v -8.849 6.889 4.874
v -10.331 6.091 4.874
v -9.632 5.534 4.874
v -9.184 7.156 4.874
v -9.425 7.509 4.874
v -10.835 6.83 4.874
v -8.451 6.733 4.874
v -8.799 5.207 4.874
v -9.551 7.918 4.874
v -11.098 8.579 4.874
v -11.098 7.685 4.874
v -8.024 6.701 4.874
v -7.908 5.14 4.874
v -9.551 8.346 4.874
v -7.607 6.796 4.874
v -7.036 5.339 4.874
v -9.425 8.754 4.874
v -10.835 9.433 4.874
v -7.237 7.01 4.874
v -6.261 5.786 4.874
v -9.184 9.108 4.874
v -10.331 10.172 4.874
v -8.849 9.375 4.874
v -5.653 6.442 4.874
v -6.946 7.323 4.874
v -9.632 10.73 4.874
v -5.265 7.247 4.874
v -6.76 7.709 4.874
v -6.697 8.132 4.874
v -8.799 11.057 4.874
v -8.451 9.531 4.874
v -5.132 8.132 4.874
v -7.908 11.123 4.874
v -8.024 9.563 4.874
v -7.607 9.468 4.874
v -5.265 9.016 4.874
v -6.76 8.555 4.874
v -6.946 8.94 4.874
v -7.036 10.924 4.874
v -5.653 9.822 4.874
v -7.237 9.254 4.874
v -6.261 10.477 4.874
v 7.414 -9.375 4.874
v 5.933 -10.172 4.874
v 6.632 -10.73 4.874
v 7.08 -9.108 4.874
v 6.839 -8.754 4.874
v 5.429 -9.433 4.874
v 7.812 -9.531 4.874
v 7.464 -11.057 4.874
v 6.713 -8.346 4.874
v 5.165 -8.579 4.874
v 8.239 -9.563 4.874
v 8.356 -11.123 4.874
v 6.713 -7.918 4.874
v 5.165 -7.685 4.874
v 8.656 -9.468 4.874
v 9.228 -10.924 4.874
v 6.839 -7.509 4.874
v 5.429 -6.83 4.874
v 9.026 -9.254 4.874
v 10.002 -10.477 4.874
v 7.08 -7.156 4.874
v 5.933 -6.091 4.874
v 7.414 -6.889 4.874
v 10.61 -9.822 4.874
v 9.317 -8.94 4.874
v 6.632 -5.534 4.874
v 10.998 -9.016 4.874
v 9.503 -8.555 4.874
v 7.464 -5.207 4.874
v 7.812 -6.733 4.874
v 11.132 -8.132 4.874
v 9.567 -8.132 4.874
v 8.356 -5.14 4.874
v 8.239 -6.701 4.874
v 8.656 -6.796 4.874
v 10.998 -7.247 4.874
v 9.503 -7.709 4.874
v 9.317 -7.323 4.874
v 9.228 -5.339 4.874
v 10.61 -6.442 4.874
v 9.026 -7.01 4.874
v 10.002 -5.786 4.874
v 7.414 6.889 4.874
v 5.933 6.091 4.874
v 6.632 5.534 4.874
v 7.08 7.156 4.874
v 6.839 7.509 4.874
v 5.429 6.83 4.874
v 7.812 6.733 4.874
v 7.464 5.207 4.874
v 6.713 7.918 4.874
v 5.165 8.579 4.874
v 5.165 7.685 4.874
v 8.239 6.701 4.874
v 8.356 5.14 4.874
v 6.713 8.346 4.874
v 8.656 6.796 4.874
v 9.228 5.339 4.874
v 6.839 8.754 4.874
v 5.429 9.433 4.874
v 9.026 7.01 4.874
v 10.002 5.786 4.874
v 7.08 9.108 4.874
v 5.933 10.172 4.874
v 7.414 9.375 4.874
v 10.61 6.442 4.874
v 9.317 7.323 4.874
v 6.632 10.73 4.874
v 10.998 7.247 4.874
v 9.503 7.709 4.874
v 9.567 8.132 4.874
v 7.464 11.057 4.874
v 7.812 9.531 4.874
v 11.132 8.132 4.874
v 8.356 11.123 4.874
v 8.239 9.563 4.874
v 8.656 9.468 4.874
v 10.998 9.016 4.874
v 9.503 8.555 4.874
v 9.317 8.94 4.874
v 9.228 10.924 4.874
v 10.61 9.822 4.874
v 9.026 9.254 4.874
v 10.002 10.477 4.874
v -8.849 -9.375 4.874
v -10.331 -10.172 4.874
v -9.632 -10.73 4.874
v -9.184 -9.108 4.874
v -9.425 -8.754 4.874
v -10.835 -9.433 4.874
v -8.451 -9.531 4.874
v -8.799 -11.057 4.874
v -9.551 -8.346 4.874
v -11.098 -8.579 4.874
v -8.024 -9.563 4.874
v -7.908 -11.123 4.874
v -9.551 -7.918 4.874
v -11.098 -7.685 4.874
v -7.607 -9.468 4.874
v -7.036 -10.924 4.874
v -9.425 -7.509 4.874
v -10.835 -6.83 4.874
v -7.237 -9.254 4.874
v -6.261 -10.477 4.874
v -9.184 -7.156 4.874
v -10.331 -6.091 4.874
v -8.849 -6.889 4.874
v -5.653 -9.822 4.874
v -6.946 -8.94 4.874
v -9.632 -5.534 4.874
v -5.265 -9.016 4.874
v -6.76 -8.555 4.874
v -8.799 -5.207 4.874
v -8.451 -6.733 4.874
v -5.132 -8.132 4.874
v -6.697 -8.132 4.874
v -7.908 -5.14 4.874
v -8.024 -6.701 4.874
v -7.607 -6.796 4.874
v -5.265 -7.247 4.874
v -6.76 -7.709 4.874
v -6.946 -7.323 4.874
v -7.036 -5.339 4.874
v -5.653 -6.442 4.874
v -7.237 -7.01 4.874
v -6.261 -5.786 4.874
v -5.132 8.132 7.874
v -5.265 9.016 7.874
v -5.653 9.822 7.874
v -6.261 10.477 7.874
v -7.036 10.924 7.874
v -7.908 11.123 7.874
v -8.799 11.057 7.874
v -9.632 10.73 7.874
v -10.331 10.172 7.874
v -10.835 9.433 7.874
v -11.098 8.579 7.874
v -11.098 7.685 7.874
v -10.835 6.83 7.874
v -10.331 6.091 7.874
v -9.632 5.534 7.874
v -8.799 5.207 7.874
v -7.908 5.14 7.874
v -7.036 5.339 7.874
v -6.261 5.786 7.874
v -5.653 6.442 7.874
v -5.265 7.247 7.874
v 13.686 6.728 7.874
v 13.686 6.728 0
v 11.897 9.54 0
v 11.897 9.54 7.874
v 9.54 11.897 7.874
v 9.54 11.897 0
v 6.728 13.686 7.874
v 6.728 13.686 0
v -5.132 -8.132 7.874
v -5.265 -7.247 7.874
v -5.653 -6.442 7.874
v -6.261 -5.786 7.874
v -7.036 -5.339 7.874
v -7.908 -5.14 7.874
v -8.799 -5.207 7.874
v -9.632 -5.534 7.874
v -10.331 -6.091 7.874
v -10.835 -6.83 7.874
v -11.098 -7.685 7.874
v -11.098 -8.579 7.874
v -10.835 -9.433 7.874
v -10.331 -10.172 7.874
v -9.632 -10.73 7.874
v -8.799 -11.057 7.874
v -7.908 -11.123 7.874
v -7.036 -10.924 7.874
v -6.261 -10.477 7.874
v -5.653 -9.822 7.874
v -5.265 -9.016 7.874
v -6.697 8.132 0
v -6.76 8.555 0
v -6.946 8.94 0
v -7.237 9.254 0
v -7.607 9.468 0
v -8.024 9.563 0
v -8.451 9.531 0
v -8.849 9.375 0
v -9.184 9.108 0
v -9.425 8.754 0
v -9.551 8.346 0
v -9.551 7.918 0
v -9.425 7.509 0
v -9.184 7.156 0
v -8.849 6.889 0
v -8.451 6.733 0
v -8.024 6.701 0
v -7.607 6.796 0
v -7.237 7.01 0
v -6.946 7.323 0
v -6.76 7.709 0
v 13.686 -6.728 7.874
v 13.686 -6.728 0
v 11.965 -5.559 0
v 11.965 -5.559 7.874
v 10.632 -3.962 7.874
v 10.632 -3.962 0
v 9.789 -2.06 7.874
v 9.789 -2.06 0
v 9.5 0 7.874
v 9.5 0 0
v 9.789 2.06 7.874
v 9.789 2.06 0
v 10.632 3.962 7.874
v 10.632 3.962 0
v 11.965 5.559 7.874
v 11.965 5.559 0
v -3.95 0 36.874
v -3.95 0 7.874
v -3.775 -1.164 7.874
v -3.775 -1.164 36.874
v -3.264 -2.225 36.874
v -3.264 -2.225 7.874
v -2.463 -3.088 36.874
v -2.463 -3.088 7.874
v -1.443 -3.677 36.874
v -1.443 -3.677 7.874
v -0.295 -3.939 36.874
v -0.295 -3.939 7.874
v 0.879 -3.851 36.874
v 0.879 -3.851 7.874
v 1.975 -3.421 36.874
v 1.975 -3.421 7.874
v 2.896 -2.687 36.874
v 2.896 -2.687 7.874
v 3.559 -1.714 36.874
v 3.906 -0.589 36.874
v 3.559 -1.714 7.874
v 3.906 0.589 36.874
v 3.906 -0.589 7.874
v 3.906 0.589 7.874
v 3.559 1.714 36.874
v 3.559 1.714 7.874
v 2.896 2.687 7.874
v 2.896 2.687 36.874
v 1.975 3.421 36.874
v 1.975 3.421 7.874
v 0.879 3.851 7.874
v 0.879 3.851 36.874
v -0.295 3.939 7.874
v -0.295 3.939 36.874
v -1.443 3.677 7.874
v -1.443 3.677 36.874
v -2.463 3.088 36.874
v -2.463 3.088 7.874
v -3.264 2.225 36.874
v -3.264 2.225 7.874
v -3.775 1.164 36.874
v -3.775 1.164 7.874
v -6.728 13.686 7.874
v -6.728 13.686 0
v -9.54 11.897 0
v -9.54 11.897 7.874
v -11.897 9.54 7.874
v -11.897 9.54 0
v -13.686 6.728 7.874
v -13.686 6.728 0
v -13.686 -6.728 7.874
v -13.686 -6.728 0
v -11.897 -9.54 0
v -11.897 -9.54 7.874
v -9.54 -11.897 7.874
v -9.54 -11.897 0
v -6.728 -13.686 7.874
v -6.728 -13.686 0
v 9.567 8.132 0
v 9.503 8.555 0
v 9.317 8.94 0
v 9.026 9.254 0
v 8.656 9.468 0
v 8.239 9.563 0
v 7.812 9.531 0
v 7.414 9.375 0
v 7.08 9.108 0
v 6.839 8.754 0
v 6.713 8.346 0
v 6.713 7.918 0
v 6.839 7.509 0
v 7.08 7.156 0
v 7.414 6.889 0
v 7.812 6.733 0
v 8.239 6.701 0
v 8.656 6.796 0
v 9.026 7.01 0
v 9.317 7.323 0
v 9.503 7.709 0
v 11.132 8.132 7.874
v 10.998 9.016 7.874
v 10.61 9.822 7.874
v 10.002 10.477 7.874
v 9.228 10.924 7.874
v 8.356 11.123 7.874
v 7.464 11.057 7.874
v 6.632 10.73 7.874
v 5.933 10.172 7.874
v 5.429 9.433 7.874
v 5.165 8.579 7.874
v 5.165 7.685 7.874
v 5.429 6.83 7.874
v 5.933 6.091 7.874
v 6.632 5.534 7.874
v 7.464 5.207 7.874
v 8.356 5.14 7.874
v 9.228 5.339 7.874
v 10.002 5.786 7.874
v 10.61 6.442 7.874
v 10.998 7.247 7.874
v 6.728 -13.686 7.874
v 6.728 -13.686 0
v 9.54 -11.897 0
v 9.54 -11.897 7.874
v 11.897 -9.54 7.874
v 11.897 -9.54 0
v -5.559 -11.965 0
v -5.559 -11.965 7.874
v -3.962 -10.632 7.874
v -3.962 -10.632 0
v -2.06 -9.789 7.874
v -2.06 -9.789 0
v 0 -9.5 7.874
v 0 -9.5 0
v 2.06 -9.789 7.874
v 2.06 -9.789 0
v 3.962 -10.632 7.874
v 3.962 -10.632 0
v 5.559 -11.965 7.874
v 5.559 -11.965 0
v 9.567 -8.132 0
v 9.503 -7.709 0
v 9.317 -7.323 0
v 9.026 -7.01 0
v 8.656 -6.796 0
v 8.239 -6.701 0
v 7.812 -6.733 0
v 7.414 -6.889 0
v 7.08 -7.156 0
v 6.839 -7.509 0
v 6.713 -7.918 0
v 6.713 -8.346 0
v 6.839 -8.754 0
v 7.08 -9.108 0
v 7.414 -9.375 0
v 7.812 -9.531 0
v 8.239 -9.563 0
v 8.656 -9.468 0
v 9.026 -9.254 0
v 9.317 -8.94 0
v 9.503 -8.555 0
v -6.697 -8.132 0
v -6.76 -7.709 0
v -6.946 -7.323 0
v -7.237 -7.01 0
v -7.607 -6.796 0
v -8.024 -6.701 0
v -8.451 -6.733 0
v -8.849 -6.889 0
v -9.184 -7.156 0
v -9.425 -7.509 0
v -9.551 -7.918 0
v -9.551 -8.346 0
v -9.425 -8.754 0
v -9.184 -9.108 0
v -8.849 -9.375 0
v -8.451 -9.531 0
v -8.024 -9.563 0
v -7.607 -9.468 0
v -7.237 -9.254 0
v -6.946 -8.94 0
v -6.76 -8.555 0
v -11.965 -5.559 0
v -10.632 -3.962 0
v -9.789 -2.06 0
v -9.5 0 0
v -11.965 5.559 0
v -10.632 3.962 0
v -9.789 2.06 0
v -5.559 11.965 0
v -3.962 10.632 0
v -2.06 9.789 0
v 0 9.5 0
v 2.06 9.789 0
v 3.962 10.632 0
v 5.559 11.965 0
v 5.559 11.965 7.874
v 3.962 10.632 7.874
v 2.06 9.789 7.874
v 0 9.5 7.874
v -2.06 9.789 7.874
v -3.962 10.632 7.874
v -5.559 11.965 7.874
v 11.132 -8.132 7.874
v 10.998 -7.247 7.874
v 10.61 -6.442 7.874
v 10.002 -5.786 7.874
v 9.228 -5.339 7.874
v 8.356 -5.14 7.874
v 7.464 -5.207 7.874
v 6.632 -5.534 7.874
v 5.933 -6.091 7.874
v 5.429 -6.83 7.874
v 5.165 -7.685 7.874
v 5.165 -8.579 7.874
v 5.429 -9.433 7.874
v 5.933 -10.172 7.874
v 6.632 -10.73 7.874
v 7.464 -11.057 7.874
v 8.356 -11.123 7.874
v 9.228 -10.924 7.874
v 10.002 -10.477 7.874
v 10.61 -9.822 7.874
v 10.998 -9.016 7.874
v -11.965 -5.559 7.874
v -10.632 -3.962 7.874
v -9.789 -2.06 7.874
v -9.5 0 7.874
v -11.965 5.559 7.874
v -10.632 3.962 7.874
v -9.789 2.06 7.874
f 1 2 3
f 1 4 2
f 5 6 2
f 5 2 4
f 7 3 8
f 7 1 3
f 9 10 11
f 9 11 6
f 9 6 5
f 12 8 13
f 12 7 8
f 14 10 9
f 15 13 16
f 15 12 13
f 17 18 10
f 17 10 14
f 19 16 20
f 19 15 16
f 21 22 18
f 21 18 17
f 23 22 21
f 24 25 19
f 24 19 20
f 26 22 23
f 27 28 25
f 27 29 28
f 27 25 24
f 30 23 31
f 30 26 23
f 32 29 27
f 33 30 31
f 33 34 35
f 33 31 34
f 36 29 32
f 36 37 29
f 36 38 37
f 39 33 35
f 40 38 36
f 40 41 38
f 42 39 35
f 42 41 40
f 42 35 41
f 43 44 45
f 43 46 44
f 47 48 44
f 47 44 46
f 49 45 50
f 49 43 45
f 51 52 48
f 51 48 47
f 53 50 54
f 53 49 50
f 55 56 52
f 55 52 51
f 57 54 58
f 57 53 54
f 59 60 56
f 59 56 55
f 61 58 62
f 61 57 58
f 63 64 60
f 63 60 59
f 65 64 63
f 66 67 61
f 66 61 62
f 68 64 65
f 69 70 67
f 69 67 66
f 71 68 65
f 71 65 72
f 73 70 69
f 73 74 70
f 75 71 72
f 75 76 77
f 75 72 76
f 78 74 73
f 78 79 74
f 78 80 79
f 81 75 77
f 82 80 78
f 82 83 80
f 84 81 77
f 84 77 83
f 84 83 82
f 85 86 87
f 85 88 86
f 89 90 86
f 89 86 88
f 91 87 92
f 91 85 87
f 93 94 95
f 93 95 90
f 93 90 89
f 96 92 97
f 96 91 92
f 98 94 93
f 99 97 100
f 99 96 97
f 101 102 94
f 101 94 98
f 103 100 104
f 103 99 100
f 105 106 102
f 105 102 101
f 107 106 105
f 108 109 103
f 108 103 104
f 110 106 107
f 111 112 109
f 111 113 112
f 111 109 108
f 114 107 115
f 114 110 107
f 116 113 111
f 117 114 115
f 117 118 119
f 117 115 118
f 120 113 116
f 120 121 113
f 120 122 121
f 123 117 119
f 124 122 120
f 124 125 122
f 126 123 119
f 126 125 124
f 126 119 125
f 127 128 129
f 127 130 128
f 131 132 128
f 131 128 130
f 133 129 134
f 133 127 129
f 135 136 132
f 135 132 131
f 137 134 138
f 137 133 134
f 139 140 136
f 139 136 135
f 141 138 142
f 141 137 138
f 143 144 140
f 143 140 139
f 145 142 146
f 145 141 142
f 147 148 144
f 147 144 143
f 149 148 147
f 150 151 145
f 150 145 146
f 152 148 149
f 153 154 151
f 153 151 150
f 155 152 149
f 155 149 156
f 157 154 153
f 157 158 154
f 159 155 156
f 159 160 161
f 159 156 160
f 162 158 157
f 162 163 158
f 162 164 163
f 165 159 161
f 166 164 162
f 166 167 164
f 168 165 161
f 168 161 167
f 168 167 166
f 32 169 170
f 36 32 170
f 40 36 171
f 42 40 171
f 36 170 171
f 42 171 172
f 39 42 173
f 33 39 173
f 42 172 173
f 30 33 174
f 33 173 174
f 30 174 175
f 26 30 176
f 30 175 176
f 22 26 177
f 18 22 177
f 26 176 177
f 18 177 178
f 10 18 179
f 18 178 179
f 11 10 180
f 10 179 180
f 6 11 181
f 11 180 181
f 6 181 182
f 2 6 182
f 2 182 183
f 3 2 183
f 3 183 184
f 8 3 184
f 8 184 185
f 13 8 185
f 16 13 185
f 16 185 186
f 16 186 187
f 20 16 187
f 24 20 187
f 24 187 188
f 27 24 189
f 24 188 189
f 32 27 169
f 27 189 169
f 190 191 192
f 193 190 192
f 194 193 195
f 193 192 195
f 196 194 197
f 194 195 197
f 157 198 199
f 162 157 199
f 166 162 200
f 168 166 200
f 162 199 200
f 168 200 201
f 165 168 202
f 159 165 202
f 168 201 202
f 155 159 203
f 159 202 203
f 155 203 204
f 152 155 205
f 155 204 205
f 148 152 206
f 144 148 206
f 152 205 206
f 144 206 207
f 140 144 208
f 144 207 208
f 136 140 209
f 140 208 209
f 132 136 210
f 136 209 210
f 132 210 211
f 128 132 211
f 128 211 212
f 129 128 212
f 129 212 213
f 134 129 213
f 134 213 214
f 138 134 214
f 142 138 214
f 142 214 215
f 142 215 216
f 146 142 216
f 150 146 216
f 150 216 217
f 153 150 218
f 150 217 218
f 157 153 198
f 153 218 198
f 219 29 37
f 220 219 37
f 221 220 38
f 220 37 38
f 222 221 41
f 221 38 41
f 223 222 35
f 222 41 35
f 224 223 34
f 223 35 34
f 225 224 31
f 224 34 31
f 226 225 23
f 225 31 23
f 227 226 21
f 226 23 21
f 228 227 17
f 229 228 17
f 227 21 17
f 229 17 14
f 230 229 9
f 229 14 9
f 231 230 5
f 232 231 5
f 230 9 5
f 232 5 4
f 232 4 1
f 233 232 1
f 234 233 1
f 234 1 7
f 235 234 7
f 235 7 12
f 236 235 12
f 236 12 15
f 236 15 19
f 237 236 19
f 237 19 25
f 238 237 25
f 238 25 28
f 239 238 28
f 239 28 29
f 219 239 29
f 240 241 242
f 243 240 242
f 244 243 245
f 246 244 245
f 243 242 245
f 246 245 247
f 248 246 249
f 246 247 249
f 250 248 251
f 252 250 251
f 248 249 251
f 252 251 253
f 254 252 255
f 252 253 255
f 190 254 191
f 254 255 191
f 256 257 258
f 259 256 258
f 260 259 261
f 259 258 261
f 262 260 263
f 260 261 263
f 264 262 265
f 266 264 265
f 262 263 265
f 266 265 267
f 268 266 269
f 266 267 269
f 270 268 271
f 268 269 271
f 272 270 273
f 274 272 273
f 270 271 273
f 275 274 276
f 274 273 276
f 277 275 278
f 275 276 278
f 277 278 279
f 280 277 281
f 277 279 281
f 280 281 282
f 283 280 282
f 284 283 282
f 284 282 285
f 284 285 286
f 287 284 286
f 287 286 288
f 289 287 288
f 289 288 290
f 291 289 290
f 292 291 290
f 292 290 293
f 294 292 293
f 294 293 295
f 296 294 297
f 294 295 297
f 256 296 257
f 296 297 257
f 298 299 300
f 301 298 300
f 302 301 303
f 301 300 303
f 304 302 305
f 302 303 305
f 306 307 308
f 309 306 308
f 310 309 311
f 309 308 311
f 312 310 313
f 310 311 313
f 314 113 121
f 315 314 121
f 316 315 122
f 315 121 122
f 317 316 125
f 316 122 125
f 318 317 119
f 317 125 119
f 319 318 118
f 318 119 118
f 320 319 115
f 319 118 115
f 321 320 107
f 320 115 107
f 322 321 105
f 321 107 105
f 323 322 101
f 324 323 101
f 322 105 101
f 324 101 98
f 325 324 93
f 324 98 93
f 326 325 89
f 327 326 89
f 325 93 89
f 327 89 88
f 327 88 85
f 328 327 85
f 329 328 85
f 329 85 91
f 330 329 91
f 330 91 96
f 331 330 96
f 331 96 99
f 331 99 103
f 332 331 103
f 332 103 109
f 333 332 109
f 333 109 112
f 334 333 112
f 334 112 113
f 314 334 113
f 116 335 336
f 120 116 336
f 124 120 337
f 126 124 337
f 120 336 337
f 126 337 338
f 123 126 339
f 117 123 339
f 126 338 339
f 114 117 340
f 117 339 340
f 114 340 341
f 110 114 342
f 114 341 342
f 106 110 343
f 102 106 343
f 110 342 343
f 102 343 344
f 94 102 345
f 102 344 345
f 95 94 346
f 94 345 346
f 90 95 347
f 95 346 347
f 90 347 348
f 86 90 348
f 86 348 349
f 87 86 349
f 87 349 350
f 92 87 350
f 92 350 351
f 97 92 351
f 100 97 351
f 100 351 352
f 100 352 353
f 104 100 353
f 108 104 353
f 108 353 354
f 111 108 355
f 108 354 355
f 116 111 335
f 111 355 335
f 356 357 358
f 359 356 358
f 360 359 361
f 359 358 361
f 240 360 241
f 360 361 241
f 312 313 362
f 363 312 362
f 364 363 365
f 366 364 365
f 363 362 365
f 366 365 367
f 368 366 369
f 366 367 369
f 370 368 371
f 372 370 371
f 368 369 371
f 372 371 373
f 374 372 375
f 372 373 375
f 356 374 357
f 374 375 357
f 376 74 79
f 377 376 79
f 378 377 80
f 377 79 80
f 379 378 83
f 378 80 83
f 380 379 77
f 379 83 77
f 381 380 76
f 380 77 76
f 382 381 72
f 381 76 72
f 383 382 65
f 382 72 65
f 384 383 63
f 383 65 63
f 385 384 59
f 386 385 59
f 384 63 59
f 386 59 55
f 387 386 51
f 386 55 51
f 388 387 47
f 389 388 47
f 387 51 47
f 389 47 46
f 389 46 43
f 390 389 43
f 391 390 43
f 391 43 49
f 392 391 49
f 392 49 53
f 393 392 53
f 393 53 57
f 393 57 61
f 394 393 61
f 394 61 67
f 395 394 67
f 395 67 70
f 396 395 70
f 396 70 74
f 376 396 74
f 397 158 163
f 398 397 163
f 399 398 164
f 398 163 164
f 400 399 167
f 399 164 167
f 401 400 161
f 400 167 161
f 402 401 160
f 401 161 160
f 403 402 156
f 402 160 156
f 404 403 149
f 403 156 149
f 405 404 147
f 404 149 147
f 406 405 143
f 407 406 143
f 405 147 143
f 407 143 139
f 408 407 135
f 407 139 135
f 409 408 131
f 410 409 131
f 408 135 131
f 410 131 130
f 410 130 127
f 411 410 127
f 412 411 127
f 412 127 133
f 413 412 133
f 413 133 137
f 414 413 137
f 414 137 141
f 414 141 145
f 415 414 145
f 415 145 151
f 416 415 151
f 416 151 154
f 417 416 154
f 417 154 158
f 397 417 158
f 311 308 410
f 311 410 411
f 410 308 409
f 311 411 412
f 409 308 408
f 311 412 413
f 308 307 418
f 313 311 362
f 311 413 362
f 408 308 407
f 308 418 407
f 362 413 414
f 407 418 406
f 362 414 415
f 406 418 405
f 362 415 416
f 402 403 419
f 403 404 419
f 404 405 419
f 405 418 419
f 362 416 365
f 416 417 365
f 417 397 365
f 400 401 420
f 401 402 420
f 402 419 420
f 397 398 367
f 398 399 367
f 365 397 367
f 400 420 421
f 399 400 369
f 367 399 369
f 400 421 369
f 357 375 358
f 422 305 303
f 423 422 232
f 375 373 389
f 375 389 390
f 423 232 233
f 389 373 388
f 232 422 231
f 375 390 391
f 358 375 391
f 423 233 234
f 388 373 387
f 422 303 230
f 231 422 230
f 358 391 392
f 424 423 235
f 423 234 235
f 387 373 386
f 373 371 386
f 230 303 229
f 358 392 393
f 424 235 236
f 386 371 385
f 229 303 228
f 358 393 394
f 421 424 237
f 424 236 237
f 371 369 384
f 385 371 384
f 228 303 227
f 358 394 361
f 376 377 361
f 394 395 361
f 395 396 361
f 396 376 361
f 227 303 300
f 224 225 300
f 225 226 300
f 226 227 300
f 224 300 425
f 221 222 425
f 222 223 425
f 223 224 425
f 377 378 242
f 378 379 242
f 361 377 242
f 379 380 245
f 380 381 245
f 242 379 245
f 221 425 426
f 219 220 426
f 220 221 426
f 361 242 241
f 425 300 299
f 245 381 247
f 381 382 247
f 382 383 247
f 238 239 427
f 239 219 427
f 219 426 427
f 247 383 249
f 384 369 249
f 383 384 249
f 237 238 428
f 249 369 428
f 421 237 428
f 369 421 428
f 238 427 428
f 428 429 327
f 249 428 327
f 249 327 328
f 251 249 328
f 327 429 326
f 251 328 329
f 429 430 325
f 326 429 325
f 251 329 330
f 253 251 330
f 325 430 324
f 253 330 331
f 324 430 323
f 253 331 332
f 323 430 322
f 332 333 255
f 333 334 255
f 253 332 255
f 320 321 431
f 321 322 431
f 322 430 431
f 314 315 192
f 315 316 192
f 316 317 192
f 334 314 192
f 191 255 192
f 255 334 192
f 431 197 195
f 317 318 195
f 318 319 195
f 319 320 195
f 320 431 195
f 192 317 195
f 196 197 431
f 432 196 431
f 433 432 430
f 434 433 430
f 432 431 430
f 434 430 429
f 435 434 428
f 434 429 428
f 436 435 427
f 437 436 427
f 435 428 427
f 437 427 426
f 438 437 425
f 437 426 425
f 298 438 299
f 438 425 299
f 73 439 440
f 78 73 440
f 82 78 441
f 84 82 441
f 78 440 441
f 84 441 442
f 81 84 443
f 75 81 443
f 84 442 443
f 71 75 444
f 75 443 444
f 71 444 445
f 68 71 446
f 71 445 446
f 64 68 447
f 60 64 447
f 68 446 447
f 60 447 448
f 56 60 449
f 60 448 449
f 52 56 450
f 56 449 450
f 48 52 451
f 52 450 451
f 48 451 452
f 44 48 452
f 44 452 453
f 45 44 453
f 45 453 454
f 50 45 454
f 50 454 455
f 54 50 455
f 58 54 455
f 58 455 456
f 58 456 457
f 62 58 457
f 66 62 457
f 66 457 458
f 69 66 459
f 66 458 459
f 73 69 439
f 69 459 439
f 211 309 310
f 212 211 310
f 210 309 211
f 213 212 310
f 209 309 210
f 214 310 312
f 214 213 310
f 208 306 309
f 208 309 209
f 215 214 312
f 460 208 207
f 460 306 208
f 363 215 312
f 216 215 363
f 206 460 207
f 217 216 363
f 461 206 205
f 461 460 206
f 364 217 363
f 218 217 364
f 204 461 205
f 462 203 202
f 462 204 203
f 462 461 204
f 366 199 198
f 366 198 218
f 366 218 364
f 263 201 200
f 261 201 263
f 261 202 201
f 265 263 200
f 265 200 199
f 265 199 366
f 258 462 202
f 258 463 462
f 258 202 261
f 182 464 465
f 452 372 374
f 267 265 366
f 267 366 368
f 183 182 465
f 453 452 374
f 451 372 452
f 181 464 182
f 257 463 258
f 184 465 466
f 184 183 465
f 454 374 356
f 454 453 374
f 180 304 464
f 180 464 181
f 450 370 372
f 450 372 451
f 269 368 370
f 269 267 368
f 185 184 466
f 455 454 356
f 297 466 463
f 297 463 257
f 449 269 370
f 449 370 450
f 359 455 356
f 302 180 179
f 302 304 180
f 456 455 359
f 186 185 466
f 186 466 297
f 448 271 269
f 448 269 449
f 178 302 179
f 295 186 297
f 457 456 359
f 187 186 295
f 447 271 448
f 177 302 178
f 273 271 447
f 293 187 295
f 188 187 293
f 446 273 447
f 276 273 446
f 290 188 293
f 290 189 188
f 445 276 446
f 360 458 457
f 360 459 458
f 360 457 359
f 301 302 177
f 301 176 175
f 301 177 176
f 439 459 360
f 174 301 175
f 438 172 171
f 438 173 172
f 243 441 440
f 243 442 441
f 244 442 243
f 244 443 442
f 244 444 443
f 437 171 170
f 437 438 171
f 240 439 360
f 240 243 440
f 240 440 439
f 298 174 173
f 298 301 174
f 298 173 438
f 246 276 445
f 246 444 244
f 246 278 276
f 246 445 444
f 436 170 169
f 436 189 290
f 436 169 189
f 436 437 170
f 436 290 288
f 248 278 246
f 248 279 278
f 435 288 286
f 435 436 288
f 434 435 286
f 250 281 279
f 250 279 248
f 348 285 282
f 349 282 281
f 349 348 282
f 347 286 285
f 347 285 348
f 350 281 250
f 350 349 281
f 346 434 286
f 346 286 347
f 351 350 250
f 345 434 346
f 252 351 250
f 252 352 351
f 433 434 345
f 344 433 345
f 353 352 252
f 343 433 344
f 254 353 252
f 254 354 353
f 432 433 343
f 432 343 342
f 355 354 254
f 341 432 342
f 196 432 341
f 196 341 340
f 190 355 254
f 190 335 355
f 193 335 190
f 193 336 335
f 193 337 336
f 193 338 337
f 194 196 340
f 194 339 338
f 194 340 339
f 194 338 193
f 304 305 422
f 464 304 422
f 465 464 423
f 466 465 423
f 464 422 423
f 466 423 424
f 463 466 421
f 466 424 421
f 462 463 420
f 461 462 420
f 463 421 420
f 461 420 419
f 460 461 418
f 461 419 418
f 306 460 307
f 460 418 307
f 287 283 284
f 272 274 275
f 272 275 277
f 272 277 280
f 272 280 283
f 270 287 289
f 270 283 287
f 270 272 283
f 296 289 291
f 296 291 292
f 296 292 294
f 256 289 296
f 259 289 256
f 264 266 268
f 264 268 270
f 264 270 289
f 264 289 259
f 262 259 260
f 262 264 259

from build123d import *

# Parameters (mm, degrees)
BOSS_EXTRUDE1_DEPTH = 7.874
SKETCH2_R           = 1.4351
CUT_EXTRUDE1_DEPTH  = 7.874
SKETCH3_R           = 3
CUT_EXTRUDE2_DEPTH  = 3
SKETCH4_R           = 3.95
BOSS_EXTRUDE2_DEPTH = 29


with BuildPart() as part:
    # Sketch1 → Boss-Extrude1 (new body)
    with BuildSketch(Plane.XY):
        with BuildLine():
            ThreePointArc((6.727938916, 13.685661765), (0, 9.5), (-6.727938916, 13.685661765))
            ThreePointArc((-6.727938916, 13.685661765), (-10.783378413, 10.783378413), (-13.685661765, 6.727938916))
            ThreePointArc((-13.685661765, 6.727938916), (-9.5, 0), (-13.685661765, -6.727938916))
            ThreePointArc((-13.685661765, -6.727938916), (-10.783378413, -10.783378413), (-6.727938916, -13.685661765))
            ThreePointArc((-6.727938916, -13.685661765), (0, -9.5), (6.727938916, -13.685661765))
            ThreePointArc((6.727938916, -13.685661765), (10.783378413, -10.783378413), (13.685661765, -6.727938916))
            ThreePointArc((13.685661765, -6.727938916), (9.5, 0), (13.685661765, 6.727938916))
            ThreePointArc((13.685661765, 6.727938916), (10.783378413, 10.783378413), (6.727938916, 13.685661765))
        make_face()
    extrude(amount=BOSS_EXTRUDE1_DEPTH)

    # Sketch2 → Cut-Extrude1 (cut)
    with BuildSketch(Plane.XY.offset(7.874)):
        with Locations((-8.131727984, 8.131727984)):
            Circle(SKETCH2_R)
        with Locations((8.131727984, -8.131727984)):
            Circle(SKETCH2_R)
        with Locations((-8.131727984, -8.131727984)):
            Circle(SKETCH2_R)
        with Locations((8.131727984, 8.131727984)):
            Circle(SKETCH2_R)
    extrude(amount=-CUT_EXTRUDE1_DEPTH, mode=Mode.SUBTRACT)

    # Sketch3 → Cut-Extrude2 (cut)
    with BuildSketch(Plane.XY.offset(7.874)):
        with Locations((-8.131727984, 8.131727984)):
            Circle(SKETCH3_R)
        with Locations((-8.131727984, -8.131727984)):
            Circle(SKETCH3_R)
        with Locations((8.131727984, -8.131727984)):
            Circle(SKETCH3_R)
        with Locations((8.131727984, 8.131727984)):
            Circle(SKETCH3_R)
    extrude(amount=-CUT_EXTRUDE2_DEPTH, mode=Mode.SUBTRACT)

    # Sketch4 → Boss-Extrude2 (add)
    with BuildSketch(Plane.XY.offset(7.874)):
        with Locations(Location((0, 0, 0), (0, 0, 180))):
            Circle(SKETCH4_R)
    extrude(amount=BOSS_EXTRUDE2_DEPTH)


solid = part.part
